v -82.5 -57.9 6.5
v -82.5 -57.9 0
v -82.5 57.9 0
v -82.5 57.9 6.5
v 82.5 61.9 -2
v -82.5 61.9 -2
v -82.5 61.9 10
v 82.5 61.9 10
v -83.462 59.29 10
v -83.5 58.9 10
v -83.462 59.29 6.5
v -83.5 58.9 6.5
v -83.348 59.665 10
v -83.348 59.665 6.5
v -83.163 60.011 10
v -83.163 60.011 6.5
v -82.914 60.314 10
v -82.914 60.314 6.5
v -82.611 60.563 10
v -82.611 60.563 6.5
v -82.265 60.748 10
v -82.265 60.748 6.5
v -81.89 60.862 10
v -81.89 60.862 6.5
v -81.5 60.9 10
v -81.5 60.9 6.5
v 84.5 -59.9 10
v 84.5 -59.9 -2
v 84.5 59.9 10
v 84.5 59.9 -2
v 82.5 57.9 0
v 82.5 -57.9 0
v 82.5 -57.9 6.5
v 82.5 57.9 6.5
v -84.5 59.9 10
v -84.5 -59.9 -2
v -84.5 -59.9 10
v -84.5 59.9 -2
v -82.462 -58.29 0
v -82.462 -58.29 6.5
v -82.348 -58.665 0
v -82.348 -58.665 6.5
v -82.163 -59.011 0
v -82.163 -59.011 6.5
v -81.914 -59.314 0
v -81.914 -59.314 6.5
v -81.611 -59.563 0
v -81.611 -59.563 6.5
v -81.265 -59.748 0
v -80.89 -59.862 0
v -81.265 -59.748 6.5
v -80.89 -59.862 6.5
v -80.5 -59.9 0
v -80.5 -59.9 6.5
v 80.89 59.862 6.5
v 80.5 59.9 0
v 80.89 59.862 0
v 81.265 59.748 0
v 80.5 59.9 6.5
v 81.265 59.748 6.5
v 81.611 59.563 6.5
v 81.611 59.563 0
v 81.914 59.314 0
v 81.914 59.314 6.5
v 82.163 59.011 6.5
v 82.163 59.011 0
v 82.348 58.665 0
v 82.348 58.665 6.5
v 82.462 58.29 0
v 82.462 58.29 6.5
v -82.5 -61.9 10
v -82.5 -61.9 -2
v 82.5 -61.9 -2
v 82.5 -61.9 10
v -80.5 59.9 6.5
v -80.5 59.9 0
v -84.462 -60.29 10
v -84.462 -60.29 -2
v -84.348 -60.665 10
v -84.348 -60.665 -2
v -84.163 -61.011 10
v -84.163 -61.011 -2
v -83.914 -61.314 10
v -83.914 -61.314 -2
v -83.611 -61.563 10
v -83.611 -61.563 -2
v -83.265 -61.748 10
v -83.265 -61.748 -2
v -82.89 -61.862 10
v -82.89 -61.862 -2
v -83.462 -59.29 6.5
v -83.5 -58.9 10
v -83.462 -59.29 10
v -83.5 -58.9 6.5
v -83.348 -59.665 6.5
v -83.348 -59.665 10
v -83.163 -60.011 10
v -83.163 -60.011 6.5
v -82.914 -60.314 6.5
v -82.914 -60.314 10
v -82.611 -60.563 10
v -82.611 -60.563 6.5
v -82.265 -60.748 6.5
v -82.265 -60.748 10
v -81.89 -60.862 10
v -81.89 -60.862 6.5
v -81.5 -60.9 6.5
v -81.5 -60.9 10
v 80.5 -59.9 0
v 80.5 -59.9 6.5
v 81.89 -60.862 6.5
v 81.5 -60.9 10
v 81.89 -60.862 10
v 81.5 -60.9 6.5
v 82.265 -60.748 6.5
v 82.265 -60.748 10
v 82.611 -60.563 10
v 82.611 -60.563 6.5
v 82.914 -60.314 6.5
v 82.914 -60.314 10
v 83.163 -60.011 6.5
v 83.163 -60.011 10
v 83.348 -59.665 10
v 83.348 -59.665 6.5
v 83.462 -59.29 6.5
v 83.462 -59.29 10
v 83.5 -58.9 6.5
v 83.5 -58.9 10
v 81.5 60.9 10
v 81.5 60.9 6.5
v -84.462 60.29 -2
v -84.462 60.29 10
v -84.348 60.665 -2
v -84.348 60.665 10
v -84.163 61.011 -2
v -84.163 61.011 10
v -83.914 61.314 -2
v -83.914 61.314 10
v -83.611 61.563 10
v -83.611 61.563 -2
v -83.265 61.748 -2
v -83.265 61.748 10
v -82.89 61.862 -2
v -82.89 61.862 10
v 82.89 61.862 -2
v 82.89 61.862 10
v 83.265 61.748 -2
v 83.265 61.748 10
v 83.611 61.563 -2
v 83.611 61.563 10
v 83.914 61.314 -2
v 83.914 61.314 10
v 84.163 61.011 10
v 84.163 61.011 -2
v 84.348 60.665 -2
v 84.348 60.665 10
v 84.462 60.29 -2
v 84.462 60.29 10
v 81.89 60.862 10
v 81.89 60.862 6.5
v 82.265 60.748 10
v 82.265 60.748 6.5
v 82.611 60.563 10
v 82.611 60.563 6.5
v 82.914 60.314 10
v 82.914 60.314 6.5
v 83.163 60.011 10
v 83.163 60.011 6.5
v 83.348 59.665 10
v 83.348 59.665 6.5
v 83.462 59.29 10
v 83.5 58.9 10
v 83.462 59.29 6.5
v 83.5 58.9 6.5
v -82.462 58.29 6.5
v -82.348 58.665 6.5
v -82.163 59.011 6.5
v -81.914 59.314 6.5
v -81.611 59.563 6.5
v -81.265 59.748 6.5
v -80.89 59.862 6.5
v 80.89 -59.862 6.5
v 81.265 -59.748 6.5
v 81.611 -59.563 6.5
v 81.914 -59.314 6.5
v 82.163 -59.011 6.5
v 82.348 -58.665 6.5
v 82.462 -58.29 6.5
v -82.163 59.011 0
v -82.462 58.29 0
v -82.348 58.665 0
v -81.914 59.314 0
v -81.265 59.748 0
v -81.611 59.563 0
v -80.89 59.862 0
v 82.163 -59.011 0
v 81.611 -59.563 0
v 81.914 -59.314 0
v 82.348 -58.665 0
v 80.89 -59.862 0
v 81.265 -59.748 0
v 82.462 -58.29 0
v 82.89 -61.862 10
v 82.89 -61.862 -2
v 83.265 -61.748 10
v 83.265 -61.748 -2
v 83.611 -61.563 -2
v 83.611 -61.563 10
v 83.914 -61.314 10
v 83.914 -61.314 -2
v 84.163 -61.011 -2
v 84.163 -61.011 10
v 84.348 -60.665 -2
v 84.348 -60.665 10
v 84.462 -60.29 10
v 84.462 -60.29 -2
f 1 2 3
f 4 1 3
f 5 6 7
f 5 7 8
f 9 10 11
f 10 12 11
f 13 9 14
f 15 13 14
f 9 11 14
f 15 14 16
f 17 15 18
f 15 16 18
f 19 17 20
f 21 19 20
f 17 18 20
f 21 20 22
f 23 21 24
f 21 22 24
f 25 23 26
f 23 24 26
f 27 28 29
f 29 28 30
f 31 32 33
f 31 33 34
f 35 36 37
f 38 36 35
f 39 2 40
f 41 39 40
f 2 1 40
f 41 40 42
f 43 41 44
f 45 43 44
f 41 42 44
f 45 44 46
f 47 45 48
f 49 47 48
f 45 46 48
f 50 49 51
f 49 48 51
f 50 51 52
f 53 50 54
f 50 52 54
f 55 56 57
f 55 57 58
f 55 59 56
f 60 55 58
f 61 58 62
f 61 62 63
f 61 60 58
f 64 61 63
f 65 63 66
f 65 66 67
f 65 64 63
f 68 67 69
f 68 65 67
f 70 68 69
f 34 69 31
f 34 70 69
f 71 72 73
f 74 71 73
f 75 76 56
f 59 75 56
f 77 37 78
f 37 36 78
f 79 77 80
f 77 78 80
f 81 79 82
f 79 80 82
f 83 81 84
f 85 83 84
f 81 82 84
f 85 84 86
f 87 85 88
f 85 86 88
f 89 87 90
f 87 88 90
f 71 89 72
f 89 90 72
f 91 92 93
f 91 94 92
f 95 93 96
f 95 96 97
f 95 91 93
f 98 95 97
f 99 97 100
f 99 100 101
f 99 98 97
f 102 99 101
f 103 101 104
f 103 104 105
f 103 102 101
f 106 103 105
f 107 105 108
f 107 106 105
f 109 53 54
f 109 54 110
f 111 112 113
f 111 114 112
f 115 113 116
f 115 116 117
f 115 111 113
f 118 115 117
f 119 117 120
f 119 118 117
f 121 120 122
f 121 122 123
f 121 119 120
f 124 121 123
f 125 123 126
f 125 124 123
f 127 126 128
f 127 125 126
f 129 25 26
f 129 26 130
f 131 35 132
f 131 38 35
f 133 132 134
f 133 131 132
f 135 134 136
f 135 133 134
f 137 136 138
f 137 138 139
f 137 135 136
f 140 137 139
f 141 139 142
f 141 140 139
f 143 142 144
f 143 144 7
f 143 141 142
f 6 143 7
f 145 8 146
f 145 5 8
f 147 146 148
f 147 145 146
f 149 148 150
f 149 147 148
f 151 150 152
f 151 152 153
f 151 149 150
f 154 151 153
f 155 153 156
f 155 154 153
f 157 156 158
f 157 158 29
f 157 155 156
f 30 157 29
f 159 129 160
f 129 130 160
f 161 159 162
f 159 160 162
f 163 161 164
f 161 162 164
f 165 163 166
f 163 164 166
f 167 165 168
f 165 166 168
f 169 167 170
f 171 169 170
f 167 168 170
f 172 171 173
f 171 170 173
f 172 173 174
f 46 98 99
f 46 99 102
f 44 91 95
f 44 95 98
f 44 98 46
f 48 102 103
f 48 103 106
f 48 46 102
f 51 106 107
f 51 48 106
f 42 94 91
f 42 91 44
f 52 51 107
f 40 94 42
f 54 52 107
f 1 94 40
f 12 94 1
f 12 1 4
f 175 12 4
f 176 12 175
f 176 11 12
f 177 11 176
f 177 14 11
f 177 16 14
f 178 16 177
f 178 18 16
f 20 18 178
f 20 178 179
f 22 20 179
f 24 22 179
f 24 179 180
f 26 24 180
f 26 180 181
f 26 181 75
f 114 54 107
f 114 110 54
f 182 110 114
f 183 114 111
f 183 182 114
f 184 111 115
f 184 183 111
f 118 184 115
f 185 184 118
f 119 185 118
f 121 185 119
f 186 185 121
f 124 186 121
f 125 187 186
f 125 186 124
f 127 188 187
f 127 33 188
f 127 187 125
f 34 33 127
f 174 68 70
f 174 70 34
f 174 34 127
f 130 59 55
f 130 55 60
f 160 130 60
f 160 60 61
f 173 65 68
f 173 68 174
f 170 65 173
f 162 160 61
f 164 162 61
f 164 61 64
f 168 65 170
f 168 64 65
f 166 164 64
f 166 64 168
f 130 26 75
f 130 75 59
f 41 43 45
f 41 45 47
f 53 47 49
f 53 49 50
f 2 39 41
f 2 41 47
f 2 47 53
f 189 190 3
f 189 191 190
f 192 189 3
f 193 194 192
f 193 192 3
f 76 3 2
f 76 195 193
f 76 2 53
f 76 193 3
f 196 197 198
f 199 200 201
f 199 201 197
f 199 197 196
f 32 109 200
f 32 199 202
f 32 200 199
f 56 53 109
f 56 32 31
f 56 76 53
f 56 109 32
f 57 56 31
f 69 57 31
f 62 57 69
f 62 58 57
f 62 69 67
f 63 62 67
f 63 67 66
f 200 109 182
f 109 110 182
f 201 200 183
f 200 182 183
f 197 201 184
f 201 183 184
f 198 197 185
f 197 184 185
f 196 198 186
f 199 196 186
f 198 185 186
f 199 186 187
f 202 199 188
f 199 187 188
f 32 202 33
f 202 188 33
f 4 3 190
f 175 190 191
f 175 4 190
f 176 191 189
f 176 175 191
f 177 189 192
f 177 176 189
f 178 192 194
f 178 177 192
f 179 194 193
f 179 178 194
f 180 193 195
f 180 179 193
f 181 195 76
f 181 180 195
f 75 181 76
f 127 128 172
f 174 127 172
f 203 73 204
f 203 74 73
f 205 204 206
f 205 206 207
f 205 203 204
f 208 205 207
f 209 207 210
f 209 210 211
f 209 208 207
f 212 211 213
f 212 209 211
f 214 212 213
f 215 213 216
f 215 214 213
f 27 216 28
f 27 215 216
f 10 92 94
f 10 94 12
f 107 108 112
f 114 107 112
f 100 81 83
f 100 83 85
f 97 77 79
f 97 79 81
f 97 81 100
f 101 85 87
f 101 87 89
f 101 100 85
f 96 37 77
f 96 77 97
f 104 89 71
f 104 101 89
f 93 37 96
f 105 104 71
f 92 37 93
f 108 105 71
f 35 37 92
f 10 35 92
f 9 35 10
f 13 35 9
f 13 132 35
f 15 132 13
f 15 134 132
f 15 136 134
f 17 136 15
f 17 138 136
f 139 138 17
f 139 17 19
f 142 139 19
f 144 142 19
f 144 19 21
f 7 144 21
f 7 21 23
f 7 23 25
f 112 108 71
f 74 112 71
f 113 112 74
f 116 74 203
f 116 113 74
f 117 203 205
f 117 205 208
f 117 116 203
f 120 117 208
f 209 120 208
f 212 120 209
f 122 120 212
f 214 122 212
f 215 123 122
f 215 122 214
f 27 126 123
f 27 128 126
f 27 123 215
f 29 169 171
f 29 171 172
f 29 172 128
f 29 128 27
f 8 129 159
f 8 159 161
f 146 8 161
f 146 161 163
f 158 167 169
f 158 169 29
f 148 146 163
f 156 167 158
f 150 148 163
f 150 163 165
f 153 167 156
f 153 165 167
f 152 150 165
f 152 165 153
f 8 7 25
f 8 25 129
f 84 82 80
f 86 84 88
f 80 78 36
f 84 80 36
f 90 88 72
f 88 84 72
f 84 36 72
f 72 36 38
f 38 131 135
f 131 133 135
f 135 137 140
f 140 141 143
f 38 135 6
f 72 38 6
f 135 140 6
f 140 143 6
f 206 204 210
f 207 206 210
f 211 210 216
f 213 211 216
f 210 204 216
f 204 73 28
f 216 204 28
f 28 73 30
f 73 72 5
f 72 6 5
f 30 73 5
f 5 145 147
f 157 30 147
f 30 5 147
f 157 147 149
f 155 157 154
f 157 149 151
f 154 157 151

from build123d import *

# Parameters (mm, degrees)
F0_W     = 165
F0_H     = 119.8
F1_DEPTH = 10
F2_T     = 2
F3_W     = 167
F3_H     = 121.8
F4_DEPTH = 3.5
F5_R     = 2


with BuildPart() as f1:
    # F0 (on Top) → F1 (new body)
    with BuildSketch(Plane.XY):
        Rectangle(F0_W, F0_H)
    extrude(amount=F1_DEPTH)

    # F2
    f2_openings = [f1.faces().sort_by_distance(p)[0] for p in [
        (0, 0, 10),
    ]]
    offset(amount=F2_T, openings=f2_openings, kind=Kind.INTERSECTION)

    # F3 (on face) → F4 (cut)
    with BuildSketch(Plane.XY.offset(10)):
        Rectangle(F3_W, F3_H)
    extrude(amount=-F4_DEPTH, mode=Mode.SUBTRACT)

    # F5
    f5_edges = [f1.edges().sort_by_distance(p)[0] for p in [
        (-82.5, -59.9, 3.25),
        (82.5, -59.9, 3.25),
        (82.5, 59.9, 3.25),
        (-82.5, 59.9, 3.25),
        (-83.5, 60.9, 8.25),
        (-84.5, 61.9, 4),
        (83.5, 60.9, 8.25),
        (84.5, 61.9, 4),
        (-84.5, -61.9, 4),
        (-83.5, -60.9, 8.25),
        (84.5, -61.9, 4),
        (83.5, -60.9, 8.25),
    ]]
    fillet(f5_edges, radius=F5_R)


solid = f1.part
